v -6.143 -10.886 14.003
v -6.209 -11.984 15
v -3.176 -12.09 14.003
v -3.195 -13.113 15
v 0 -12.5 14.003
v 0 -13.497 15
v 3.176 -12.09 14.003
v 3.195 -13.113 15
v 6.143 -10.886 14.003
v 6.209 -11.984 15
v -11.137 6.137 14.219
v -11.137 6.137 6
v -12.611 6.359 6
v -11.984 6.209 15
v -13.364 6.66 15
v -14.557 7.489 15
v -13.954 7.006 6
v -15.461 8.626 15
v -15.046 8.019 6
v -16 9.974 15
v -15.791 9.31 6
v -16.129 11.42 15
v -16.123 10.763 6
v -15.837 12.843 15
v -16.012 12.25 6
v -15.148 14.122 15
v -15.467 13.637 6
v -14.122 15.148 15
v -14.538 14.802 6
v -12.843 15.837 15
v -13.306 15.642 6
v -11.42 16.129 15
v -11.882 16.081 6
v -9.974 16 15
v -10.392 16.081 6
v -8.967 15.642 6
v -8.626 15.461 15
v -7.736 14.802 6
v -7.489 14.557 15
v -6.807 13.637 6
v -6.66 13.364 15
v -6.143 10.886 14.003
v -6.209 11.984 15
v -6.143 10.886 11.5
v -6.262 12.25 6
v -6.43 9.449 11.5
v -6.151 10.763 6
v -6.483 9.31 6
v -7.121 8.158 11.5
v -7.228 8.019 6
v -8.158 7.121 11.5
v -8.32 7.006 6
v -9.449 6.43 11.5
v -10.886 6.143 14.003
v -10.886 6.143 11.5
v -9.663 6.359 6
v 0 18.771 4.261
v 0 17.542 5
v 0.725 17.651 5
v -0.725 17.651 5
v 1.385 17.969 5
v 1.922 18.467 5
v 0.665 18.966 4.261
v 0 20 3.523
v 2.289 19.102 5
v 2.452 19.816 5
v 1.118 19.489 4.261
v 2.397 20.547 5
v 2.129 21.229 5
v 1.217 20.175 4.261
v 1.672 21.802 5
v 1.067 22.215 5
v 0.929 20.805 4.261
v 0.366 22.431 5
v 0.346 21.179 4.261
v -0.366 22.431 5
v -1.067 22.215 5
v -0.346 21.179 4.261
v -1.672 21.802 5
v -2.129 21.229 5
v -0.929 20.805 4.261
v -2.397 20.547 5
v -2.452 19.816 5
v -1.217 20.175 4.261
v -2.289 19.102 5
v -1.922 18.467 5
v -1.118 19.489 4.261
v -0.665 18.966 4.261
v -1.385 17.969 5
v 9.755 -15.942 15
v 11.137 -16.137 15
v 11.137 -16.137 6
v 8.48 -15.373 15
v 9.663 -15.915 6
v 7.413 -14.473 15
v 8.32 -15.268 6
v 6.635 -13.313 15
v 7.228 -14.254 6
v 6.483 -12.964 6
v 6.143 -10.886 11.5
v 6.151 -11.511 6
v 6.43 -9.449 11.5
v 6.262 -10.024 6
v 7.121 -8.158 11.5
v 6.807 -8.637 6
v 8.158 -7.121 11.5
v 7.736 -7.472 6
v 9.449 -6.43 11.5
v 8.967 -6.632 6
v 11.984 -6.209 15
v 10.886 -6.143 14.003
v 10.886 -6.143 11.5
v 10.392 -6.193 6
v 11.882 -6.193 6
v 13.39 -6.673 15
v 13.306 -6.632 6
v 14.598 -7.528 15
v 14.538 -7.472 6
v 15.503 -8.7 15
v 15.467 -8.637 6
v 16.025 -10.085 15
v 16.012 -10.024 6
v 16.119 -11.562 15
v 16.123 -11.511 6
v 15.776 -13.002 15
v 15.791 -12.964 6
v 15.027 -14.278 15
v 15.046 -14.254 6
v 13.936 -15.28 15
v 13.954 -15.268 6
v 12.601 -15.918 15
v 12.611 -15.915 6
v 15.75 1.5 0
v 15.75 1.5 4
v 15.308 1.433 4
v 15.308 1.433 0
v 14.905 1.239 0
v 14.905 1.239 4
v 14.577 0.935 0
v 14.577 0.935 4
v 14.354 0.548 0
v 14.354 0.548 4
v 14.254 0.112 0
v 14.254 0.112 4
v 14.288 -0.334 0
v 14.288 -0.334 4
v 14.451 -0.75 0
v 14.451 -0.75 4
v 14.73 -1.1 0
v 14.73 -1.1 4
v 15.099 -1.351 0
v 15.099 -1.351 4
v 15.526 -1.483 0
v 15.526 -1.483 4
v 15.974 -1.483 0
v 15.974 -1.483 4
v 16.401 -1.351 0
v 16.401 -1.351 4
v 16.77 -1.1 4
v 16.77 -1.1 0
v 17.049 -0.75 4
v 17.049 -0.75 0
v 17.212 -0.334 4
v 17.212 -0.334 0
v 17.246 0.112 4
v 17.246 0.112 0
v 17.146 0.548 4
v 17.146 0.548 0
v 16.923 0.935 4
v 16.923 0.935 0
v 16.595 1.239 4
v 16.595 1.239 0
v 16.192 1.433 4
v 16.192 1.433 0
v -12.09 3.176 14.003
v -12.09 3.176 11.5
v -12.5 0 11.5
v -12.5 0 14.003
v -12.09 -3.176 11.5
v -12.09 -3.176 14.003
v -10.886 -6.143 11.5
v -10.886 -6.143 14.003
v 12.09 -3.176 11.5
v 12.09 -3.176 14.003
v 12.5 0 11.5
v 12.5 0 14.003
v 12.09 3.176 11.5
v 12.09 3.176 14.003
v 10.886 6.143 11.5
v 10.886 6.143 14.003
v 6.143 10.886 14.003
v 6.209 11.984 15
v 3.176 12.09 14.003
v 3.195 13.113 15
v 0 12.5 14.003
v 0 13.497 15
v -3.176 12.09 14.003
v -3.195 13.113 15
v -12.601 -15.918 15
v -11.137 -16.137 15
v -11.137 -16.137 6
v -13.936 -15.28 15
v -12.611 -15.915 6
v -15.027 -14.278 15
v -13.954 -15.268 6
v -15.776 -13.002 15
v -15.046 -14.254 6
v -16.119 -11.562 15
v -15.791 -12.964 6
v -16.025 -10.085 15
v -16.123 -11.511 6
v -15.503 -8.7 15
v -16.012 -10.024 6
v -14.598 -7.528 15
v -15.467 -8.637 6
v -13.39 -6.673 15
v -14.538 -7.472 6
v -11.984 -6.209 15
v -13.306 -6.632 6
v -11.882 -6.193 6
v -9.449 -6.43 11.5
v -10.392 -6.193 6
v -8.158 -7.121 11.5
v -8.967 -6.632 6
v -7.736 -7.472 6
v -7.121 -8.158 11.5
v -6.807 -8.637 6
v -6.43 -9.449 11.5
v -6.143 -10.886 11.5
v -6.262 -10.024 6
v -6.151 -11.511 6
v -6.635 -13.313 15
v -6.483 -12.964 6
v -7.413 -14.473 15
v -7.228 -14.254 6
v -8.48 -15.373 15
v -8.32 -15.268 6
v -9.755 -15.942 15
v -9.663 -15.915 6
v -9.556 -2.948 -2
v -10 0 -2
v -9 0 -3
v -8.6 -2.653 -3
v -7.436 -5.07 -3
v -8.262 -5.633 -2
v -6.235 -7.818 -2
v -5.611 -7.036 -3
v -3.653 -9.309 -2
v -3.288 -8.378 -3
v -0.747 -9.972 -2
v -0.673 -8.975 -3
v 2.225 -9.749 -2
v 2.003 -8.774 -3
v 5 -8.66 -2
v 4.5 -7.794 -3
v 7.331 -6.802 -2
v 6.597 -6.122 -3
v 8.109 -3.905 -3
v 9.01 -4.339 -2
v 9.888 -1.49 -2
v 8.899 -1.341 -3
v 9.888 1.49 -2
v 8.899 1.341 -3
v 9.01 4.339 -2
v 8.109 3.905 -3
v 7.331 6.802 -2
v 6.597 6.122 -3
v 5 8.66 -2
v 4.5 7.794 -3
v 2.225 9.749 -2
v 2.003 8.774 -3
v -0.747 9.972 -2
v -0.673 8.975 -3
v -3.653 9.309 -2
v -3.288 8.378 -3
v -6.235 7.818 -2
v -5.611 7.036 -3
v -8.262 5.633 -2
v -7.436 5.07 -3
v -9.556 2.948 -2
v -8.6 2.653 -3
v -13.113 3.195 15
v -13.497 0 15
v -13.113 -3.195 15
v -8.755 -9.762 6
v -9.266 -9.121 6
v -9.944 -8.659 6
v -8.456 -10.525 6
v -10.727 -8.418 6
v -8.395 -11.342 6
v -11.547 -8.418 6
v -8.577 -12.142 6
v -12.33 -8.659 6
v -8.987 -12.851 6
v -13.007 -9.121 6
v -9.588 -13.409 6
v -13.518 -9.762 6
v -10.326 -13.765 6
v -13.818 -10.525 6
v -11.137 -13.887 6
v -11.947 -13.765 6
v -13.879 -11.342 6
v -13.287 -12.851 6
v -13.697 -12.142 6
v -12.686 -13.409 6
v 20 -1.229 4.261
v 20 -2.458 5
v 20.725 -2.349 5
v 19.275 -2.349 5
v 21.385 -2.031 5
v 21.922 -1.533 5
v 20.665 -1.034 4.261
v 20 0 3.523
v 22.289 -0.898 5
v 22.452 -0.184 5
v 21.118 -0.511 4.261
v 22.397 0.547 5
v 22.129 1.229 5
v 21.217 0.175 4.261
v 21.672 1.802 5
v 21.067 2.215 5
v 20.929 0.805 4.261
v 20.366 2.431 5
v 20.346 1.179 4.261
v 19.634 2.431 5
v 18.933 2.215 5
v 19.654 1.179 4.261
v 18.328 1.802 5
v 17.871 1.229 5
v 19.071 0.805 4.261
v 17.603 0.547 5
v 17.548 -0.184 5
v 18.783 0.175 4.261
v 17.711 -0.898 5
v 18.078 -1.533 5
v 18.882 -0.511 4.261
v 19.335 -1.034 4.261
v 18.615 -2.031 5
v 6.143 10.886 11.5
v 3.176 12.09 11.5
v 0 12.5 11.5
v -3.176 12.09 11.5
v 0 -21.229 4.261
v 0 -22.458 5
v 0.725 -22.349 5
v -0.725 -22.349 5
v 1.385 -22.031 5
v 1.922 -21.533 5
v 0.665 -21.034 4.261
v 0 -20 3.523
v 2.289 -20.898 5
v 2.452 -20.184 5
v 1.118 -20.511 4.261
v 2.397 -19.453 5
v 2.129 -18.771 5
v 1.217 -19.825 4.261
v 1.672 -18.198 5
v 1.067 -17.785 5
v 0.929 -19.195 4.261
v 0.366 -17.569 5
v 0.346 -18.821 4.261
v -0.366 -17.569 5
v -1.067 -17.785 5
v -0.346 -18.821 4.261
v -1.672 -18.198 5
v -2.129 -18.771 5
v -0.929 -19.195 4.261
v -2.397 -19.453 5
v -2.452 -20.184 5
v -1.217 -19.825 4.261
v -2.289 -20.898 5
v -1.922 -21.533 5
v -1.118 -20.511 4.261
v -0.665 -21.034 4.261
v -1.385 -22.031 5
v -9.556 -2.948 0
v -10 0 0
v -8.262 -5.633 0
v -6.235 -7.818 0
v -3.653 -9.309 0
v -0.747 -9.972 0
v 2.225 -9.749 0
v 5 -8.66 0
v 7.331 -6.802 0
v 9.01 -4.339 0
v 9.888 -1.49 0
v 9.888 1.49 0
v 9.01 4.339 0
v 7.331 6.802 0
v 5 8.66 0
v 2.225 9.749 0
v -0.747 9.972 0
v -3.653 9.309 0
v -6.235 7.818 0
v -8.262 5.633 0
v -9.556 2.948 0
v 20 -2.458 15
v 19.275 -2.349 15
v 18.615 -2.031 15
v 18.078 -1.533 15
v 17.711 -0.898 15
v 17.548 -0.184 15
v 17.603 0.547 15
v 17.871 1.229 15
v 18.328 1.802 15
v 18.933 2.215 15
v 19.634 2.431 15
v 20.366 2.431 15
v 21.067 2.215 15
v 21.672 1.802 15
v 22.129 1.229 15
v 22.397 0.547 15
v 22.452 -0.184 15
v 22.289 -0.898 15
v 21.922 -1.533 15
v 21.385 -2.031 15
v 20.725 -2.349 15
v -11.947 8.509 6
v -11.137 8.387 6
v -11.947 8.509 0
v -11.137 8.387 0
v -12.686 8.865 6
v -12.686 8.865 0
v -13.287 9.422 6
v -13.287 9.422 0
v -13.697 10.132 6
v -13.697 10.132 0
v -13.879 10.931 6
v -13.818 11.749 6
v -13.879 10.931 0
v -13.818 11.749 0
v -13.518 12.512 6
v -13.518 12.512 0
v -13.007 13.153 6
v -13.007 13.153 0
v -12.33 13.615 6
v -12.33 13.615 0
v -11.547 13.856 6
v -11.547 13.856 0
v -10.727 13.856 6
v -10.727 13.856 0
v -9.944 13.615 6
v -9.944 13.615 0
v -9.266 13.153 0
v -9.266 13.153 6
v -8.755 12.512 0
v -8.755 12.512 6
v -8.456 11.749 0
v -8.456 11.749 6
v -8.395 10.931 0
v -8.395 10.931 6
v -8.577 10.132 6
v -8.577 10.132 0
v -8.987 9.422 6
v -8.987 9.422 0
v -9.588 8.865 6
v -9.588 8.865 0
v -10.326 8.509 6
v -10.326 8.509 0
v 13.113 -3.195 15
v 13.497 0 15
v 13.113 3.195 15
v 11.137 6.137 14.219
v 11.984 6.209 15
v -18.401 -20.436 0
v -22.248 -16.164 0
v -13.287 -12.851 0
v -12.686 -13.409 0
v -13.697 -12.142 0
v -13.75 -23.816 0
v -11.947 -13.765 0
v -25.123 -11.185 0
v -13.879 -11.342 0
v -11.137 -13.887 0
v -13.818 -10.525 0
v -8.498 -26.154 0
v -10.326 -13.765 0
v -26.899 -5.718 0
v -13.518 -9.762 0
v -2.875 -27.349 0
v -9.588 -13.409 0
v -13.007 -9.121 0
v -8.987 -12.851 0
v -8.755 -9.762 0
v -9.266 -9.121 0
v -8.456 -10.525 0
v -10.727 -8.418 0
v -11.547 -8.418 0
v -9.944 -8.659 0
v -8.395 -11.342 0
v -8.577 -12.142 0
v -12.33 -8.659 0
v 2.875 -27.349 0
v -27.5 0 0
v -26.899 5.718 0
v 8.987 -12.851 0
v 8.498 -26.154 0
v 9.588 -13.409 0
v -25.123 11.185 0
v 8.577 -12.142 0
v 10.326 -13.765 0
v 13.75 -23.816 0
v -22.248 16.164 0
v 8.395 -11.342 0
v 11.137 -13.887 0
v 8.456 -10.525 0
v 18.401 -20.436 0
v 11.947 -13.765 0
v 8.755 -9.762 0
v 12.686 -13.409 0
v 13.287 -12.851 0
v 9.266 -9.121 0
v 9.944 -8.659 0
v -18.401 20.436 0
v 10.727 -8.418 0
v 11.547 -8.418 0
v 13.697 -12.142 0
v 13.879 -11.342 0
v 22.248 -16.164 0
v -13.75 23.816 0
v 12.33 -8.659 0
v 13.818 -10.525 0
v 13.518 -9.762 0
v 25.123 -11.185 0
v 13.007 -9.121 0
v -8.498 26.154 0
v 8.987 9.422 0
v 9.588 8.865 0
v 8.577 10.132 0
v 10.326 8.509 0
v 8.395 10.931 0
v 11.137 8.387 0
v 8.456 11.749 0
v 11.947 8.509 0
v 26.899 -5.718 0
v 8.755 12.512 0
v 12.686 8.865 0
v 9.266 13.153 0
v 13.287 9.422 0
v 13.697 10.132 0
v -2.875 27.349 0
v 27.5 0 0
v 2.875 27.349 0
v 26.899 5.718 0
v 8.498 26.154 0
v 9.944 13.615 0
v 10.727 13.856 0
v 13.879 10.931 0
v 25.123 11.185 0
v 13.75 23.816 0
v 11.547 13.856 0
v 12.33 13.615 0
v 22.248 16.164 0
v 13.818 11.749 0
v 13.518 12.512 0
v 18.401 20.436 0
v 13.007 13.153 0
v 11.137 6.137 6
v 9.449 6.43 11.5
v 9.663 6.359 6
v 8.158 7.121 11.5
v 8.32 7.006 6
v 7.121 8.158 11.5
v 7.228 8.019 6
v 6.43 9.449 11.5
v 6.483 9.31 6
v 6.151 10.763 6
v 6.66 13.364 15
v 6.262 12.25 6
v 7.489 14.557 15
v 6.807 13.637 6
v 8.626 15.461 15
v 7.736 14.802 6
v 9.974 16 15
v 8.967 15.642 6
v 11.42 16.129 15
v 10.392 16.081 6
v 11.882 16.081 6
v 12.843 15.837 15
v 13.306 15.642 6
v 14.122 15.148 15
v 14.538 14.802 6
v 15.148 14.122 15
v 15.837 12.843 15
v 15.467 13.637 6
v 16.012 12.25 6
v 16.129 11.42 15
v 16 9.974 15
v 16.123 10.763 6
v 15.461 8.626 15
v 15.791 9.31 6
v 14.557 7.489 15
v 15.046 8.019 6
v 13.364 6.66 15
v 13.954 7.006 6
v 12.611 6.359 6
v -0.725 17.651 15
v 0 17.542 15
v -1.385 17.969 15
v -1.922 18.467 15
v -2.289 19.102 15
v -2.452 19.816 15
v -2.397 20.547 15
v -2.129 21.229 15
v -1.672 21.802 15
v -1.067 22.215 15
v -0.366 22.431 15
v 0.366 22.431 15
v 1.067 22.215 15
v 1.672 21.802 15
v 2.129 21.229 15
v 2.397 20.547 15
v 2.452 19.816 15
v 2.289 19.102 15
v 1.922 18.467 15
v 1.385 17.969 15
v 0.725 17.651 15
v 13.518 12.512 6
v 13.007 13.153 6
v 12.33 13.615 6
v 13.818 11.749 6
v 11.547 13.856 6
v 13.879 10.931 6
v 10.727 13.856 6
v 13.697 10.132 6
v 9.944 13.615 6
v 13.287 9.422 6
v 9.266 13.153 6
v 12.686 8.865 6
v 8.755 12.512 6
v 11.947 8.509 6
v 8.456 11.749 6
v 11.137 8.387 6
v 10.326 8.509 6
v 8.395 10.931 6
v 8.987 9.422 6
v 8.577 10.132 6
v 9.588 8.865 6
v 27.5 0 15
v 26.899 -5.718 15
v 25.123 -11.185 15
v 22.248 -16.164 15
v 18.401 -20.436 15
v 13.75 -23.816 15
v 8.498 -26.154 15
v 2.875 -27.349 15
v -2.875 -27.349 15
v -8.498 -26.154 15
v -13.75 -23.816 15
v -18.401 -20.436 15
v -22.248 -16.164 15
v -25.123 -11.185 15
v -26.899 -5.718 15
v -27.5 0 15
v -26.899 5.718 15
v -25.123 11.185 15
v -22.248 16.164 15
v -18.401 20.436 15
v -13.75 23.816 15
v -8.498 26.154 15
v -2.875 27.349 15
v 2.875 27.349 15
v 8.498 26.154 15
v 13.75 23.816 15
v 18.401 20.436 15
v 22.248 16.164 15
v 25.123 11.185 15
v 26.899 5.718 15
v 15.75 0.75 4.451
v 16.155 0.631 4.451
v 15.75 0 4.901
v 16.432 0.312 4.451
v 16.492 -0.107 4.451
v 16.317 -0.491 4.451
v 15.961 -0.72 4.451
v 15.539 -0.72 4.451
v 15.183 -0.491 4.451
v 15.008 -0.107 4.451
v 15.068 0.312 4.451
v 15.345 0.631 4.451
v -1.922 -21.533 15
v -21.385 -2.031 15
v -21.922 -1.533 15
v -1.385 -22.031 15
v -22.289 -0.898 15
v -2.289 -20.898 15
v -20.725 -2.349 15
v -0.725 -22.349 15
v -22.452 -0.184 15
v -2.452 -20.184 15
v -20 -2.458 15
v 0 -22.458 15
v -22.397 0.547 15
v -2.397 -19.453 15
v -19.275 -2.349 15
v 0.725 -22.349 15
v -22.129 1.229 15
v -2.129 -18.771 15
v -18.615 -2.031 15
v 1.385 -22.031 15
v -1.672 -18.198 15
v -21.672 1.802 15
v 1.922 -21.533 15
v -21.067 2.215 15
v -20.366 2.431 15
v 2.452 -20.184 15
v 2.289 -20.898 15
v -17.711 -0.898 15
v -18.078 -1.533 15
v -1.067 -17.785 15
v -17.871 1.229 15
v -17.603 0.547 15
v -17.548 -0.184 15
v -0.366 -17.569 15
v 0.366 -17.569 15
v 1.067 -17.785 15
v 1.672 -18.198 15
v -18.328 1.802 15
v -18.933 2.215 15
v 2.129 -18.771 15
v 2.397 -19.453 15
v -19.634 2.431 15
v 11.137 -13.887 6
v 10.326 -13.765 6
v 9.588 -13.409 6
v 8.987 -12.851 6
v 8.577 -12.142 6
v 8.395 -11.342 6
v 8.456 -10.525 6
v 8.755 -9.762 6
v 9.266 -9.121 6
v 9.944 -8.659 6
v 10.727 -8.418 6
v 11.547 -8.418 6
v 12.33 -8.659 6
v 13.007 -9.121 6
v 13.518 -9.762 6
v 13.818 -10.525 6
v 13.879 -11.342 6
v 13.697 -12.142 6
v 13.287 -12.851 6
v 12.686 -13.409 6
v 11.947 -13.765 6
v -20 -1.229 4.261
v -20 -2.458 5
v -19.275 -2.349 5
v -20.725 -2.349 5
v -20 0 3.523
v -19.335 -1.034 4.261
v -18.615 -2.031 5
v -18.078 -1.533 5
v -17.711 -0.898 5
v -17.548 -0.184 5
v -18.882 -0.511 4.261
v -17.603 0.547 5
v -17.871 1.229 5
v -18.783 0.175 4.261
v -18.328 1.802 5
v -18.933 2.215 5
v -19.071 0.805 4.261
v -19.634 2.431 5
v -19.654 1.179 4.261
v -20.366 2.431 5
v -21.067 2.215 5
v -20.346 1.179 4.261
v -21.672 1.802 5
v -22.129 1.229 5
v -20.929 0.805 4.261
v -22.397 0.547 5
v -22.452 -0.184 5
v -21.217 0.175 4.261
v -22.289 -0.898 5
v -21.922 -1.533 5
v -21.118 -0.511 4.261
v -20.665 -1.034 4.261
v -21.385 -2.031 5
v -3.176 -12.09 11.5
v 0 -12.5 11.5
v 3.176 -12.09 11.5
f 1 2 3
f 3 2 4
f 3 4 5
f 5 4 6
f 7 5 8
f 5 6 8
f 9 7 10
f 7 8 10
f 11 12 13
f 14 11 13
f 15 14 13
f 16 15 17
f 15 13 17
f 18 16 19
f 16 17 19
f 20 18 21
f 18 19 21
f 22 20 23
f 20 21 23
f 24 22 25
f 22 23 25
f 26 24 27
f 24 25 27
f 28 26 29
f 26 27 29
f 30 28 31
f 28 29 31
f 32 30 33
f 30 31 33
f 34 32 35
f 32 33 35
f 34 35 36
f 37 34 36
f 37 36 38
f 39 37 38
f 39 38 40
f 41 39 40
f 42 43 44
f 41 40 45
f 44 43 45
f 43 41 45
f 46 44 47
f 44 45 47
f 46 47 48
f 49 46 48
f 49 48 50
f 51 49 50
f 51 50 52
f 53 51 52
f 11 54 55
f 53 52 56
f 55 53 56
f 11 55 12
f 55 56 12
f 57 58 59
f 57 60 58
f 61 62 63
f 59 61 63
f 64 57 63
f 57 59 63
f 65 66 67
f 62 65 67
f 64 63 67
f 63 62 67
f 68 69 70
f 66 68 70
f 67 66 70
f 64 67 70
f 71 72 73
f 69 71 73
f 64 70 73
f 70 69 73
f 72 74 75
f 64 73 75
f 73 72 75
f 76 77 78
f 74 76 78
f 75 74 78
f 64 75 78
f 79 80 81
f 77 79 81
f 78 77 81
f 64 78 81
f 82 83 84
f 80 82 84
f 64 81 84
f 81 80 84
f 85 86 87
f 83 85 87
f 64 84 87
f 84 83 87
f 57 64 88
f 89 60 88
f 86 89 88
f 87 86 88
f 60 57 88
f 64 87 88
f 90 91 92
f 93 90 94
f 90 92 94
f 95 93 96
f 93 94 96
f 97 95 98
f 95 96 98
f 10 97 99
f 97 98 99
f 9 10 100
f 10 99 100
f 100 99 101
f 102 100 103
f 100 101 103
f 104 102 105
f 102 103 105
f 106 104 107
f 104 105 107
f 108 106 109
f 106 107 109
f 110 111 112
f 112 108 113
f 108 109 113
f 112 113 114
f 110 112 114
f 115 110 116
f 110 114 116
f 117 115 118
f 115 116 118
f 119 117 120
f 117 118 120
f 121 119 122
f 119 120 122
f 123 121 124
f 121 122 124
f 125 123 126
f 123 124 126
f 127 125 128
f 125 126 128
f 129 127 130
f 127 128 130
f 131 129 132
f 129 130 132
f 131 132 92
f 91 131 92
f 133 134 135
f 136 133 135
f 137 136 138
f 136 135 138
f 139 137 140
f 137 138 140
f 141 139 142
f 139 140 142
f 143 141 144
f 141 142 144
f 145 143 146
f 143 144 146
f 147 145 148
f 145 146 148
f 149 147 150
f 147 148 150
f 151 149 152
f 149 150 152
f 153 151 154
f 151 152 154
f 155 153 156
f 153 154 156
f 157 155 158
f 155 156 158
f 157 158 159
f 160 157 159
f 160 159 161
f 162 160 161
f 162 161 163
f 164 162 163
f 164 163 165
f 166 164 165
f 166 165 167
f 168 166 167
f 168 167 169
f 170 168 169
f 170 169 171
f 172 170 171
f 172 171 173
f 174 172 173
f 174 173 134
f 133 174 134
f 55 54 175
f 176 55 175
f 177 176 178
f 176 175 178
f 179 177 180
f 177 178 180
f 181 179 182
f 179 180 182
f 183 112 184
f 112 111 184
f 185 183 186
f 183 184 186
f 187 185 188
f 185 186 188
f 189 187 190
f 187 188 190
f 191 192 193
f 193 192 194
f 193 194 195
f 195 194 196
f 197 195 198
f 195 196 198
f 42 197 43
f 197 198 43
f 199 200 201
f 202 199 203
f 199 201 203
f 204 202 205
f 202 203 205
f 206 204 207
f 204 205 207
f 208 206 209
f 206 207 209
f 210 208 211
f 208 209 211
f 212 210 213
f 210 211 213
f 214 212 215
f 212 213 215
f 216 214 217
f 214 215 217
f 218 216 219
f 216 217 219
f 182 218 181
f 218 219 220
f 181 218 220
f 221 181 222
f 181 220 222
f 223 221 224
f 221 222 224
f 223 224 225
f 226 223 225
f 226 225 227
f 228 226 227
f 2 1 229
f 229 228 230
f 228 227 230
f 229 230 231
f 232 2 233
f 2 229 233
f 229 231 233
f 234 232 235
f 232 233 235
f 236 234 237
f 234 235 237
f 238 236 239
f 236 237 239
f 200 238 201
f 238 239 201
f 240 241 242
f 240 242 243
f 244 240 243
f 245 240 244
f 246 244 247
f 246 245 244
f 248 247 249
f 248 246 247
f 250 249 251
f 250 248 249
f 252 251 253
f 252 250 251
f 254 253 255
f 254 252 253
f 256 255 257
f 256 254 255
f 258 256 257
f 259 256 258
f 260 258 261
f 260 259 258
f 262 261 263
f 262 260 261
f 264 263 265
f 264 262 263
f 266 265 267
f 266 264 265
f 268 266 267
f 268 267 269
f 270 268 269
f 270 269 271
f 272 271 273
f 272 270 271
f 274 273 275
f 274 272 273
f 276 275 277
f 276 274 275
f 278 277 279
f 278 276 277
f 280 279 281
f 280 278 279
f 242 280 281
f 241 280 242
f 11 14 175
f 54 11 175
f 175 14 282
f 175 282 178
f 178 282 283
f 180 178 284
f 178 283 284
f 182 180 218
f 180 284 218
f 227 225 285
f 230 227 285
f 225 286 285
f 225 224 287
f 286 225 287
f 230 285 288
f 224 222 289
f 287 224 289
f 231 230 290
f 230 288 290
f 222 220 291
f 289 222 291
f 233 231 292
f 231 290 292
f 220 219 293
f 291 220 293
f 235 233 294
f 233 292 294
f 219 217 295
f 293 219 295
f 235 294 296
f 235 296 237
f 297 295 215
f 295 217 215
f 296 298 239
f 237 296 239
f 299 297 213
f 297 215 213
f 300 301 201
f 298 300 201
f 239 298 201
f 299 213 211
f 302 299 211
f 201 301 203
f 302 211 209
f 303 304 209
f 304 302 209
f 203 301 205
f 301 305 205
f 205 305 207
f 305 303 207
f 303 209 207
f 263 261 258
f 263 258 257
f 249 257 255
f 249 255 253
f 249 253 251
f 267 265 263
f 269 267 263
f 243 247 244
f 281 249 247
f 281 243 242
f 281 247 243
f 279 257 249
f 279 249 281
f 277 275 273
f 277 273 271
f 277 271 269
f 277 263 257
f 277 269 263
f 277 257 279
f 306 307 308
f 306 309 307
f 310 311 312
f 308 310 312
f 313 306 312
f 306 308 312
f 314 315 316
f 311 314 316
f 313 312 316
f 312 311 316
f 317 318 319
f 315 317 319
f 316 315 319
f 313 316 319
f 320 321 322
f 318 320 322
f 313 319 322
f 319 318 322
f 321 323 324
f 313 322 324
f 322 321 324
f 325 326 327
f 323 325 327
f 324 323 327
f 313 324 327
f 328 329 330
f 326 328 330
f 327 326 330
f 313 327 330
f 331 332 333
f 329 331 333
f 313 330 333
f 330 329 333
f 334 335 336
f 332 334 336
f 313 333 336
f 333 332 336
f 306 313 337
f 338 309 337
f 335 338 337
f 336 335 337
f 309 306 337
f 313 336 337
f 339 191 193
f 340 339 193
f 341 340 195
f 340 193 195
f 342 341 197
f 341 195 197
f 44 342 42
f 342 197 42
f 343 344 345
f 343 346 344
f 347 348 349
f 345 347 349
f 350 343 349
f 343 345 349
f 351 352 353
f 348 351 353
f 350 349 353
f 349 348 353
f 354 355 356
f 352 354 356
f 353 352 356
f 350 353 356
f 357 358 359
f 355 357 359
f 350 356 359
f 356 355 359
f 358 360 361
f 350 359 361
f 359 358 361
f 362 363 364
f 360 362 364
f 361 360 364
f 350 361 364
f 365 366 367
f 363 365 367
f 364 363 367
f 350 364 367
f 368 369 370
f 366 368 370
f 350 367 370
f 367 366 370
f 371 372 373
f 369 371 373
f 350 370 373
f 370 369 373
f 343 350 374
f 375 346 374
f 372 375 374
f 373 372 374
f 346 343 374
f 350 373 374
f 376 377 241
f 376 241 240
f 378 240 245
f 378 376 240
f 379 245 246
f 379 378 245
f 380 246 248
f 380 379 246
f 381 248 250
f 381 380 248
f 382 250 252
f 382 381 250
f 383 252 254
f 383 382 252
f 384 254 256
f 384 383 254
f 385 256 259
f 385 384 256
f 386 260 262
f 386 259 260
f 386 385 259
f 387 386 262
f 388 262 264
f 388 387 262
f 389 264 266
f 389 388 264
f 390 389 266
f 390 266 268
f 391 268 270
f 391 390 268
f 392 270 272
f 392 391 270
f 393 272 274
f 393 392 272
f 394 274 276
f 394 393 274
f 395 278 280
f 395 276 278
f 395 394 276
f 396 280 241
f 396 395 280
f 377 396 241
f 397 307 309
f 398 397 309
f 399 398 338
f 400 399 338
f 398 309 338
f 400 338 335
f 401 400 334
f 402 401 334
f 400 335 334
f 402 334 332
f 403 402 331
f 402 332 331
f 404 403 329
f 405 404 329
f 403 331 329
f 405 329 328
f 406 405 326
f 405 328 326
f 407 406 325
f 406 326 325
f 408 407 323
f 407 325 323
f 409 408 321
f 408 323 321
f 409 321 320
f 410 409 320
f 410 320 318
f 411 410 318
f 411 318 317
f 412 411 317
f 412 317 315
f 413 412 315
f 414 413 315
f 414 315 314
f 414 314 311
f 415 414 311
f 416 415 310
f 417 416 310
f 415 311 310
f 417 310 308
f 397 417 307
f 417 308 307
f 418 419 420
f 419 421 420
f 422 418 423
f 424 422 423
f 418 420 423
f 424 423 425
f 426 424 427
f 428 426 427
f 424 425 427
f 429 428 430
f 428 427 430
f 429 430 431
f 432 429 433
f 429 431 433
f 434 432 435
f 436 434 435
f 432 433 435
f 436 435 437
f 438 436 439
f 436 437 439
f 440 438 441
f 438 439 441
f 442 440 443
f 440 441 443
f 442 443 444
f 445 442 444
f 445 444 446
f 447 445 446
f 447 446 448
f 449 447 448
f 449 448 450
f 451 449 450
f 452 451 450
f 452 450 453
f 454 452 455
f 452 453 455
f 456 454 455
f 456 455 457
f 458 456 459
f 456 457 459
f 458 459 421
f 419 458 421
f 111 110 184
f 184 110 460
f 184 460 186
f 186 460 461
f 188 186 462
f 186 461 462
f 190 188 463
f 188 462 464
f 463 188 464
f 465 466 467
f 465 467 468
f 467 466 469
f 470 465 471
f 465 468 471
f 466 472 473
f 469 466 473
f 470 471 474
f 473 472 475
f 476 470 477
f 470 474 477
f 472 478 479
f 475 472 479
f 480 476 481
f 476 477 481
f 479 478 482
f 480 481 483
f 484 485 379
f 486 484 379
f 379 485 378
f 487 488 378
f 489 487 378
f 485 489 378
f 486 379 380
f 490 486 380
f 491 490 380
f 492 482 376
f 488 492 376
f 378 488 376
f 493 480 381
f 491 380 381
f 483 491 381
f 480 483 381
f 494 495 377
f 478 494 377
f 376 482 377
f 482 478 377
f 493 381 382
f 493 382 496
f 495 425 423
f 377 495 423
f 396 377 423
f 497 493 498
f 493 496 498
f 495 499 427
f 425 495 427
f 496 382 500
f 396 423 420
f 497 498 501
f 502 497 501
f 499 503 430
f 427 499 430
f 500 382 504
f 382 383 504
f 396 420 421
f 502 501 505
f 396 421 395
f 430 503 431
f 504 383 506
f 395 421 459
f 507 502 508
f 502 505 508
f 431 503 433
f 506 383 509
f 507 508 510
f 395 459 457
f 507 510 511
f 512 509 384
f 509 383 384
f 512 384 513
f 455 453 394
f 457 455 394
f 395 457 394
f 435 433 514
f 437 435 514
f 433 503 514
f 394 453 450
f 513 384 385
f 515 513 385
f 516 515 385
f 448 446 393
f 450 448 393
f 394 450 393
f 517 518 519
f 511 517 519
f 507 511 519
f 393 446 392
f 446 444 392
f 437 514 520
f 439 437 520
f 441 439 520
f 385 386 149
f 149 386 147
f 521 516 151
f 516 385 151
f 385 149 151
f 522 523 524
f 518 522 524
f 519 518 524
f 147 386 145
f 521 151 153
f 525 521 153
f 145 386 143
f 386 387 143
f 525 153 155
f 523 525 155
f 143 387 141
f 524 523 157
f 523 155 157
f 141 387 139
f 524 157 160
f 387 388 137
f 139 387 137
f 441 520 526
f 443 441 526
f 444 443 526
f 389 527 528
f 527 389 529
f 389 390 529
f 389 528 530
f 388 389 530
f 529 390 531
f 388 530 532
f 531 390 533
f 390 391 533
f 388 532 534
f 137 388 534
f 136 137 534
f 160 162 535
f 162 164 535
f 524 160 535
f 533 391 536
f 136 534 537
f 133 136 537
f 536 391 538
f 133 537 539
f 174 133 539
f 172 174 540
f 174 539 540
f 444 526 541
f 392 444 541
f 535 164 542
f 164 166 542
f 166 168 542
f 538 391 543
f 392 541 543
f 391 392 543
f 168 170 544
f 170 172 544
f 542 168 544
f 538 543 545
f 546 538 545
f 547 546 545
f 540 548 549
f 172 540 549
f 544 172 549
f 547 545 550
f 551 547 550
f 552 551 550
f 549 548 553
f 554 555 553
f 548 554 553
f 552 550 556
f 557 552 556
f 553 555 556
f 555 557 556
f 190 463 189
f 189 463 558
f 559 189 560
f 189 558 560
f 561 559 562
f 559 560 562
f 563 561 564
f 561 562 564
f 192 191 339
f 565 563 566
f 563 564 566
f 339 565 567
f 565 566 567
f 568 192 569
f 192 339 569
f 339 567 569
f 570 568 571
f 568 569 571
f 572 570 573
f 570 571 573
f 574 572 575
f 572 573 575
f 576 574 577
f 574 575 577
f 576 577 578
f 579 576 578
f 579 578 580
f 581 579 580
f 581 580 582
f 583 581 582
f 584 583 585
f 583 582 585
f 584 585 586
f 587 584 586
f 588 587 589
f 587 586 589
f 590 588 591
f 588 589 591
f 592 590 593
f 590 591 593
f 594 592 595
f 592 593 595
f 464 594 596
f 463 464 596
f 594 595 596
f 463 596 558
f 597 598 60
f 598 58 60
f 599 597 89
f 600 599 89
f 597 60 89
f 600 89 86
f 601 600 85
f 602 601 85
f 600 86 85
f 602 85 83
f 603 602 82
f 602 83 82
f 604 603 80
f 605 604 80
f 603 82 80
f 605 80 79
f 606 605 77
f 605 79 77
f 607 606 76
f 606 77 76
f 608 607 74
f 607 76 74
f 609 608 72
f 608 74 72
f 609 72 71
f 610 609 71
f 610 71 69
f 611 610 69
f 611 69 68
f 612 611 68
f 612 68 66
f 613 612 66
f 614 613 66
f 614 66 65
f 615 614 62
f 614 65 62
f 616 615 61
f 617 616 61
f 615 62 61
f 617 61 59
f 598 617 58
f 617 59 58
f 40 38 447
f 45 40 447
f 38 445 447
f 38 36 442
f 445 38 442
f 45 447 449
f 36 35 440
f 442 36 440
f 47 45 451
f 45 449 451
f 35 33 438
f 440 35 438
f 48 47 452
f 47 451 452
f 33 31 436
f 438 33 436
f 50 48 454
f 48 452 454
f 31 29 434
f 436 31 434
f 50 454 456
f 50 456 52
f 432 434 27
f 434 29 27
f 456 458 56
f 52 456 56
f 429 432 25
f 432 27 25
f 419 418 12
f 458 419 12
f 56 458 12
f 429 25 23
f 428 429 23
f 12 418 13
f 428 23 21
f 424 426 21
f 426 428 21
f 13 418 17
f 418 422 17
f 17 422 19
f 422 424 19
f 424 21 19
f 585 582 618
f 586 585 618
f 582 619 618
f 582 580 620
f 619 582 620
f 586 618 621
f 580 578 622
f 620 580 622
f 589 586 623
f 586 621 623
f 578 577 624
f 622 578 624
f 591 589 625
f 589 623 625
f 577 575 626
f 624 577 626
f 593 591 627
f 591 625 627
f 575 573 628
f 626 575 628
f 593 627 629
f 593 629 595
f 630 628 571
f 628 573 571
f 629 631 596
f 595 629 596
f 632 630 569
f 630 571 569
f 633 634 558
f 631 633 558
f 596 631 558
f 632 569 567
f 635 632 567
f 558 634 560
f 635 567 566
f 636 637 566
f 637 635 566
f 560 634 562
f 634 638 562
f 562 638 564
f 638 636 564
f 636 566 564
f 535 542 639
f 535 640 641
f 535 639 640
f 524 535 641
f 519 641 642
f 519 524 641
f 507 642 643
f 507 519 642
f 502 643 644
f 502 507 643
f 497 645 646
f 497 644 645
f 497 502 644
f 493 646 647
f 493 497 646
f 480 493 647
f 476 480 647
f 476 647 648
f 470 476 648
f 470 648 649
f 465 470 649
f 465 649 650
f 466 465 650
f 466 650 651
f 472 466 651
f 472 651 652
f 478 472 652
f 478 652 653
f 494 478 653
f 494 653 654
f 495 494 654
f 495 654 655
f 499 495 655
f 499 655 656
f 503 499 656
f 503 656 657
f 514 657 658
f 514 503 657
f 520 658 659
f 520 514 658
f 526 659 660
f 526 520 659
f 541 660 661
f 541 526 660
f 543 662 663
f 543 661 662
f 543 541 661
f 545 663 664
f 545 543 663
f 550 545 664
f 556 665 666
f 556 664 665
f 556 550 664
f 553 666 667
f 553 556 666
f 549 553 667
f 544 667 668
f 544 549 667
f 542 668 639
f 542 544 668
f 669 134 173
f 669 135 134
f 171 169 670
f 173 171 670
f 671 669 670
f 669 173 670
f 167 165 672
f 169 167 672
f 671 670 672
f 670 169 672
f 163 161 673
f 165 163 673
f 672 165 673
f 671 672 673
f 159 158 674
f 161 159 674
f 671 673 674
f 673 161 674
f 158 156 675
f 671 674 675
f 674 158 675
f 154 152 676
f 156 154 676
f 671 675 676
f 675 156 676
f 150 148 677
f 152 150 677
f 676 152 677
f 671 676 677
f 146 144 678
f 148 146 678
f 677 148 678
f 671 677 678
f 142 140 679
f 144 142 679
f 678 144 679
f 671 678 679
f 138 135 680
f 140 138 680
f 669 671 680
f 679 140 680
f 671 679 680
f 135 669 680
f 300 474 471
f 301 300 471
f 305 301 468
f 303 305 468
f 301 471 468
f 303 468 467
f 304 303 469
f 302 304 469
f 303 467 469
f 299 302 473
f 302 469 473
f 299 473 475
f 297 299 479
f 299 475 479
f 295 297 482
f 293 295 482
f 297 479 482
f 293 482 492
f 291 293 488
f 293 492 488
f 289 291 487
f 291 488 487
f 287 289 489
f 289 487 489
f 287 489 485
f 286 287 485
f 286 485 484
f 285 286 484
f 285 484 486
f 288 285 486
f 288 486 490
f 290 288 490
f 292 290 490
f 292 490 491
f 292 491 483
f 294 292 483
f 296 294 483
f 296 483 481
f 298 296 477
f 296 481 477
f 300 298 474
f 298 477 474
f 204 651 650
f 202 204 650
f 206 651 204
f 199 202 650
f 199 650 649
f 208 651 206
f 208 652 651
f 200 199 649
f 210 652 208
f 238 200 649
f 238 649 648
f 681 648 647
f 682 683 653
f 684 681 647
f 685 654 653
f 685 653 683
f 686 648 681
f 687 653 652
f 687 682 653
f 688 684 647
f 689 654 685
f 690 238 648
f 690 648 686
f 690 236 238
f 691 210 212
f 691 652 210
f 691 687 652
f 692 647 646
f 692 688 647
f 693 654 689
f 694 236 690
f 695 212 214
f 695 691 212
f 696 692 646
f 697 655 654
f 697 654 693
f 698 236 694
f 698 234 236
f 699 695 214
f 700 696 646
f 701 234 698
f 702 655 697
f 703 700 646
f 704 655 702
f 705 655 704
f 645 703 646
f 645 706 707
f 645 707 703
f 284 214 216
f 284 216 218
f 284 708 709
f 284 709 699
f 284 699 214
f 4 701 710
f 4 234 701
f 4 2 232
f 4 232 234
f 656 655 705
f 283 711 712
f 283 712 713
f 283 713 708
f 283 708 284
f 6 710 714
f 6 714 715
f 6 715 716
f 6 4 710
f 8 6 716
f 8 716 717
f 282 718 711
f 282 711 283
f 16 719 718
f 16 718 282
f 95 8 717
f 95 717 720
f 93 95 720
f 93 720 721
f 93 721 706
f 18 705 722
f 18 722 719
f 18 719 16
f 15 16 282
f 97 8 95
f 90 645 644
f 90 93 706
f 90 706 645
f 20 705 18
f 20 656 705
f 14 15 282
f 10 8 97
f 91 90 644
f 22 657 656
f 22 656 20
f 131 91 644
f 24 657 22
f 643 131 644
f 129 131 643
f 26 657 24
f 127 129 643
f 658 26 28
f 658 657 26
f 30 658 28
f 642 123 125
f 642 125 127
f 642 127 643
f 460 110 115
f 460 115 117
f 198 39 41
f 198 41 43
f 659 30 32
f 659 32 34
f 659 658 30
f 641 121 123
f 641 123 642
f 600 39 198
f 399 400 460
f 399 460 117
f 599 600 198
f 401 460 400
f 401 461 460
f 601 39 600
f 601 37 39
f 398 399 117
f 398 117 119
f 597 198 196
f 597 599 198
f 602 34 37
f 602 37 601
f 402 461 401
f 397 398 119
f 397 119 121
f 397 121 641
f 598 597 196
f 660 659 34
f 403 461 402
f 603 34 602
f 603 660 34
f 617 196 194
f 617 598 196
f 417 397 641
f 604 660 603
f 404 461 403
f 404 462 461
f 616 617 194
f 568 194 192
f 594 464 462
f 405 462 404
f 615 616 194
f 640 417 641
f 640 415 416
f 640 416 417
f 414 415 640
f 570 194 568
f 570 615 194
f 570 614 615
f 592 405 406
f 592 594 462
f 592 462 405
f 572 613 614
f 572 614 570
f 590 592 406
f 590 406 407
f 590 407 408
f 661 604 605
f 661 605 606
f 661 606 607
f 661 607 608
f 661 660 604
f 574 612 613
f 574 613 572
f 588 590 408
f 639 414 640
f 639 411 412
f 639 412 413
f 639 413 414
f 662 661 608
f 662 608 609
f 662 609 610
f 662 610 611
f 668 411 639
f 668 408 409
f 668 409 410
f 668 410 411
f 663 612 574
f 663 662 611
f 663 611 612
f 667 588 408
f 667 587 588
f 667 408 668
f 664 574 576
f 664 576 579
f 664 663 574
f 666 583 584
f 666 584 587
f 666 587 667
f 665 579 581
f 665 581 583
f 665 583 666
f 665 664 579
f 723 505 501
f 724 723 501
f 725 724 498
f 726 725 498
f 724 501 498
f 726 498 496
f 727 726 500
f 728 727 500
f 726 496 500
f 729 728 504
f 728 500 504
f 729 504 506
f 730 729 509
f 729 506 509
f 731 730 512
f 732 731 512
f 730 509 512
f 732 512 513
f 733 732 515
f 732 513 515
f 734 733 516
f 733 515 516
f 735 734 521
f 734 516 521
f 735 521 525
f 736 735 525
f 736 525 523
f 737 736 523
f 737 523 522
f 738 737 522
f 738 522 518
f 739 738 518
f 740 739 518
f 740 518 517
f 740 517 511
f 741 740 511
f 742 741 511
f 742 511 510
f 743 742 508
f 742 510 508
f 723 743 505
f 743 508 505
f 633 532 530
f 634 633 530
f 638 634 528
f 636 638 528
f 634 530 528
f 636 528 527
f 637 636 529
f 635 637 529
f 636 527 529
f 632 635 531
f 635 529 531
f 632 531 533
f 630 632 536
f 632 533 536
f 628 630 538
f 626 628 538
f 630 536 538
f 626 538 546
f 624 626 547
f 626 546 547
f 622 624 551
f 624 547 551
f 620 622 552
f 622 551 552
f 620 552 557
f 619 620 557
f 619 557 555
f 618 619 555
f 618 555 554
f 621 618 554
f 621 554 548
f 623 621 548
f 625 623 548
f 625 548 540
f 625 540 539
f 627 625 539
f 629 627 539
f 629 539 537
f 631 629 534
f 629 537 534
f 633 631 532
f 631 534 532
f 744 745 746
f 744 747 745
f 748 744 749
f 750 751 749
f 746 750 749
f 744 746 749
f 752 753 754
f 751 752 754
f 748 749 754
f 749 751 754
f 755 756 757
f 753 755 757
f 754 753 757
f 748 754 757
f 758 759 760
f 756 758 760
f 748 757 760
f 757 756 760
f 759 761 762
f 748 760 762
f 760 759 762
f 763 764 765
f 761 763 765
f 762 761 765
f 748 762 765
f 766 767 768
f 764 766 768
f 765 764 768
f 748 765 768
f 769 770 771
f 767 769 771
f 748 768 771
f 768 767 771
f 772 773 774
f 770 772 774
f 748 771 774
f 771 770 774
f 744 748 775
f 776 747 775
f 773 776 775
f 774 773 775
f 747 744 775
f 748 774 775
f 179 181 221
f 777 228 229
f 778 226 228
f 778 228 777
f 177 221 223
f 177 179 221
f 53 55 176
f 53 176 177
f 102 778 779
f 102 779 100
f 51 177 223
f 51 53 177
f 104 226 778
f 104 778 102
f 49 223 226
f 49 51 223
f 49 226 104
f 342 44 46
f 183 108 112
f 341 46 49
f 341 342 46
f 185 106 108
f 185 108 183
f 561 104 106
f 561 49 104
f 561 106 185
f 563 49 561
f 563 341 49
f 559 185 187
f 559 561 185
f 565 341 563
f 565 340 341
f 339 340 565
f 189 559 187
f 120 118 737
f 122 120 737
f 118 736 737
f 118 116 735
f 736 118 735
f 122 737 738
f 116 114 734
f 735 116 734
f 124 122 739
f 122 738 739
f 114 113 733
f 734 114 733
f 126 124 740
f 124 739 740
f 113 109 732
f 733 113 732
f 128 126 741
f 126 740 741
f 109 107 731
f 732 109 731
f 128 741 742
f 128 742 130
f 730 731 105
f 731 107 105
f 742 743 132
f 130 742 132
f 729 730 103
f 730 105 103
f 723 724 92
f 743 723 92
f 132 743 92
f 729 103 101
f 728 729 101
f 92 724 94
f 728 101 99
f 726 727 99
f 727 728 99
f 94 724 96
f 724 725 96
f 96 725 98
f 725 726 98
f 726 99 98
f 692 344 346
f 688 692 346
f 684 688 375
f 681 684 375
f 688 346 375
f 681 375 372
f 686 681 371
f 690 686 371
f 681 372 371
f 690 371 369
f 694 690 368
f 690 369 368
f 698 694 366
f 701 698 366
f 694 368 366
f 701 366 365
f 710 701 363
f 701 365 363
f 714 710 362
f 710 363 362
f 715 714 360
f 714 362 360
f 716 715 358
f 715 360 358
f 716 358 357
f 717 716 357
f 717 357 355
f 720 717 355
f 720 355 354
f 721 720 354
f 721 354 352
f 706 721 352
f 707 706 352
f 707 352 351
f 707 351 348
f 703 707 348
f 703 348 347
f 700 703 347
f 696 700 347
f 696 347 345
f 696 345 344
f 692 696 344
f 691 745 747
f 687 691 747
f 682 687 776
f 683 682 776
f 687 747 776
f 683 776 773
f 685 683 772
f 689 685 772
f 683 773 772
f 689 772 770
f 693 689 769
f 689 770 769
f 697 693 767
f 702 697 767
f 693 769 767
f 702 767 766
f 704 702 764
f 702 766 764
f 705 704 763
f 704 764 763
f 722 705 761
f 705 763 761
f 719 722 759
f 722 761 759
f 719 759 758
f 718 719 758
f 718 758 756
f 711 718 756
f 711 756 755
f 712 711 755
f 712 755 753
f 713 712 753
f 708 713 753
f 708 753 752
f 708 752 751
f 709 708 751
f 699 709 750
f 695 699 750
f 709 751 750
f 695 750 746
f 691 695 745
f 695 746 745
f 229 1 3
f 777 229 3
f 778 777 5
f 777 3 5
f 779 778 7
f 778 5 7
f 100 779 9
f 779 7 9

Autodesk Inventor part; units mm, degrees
ref_plane "YZ Plane" through (0, 0, 0) normal (1, 0, 0) x (0, 1, 0)
ref_plane "XZ Plane" through (0, 0, 0) normal (0, 1, 0) x (-1, 0, 0)
ref_plane "XY Plane" through (0, 0, 0) normal (0, 0, 1) x (1, 0, 0)
sketch "Sketch1" plane through (0, 0, 0) normal (0, 0, 1) x (1, 0, 0)
  circle A0 centre (0, 0) radius 27.5
  dimension "d0" = 55
extrude "Extrusion1" add sketch "Sketch1" along normal blind 15
sketch "Sketch2" plane through (0, 0, 15) normal (0, 0, 1) x (1, 0, 0)
  circle A0 centre (0, 0) radius 27.5 projected
  circle A1 centre (0, 0) radius 12.5
  point P0 (15.75, 0)
  point P1 (20, 0)
  point P2 (11.1369, 11.1369)
  point P3 (0, 15.75)
  point P4 (-11.1369, 11.1369)
  point P5 (-15.75, 0)
  point P6 (-11.1369, -11.1369)
  point P7 (0, -15.75)
  point P8 (11.1369, -11.1369)
  point P9 (14.1421, 14.1421)
  point P10 (0, 20)
  point P11 (-14.1421, 14.1421)
  point P12 (-20, 0)
  point P13 (-14.1421, -14.1421)
  point P14 (0, -20)
  point P15 (14.1421, -14.1421)
  dimension "d3" = 15.75
  dimension "d4" = 20
  dimension "d7" = 360
  dimension "d11" = 360
  dimension "d13" = 25
extrude "Extrusion2" cut sketch "Sketch2" against normal blind 3.5 contours A1
hole "Hole1" at (-11.1369, 11.1369, 15) at (-11.1369, -11.1369, 15) at (11.1369, 11.1369, 15) at (11.1369, -11.1369, 15) direction (0, 0, -1) diameter 5.5 end through all counterbore diameter 10 counterbore depth 9 clearance for "Socket Head Cap Screw ISO 4762" size "M5" standard "ISO"
hole "Hole2" at (0, 20, 15) at (-20, 0, 15) at (0, -20, 15) at (20, 0, 15) direction (0, 0, -1) diameter 4.917 depth 10 tip angle 118 thread size "M6x1" class "6H" standard "ANSI Metric M Profile"
sketch "Sketch3" plane through (0, 0, 0) normal (0, 0, -1) x (-1, 0, 0)
  circle A0 centre (0, 0) radius 27.5 projected
  circle A1 centre (0, 0) radius 10
  point P0 (-15.75, 0)
  dimension "d31" = 15.75
  dimension "d32" = 20
hole "Hole3" at (15.75, 0, 0) direction (0, 0, 1) diameter 3 depth 4 tip angle 118
extrude "Extrusion3" add sketch "Sketch3" along normal blind 3 contours A1
chamfer "Chamfer1" distance 1 angle 45 1 edges at (10, 0, -3)
chamfer "Chamfer2" distance 1 angle 45 4 edges at (12.5, 0, 15) (0, 12.5, 15) (0, -12.5, 15) (-12.5, 0, 15)
properties part number "plate_cfs055ca501u"
